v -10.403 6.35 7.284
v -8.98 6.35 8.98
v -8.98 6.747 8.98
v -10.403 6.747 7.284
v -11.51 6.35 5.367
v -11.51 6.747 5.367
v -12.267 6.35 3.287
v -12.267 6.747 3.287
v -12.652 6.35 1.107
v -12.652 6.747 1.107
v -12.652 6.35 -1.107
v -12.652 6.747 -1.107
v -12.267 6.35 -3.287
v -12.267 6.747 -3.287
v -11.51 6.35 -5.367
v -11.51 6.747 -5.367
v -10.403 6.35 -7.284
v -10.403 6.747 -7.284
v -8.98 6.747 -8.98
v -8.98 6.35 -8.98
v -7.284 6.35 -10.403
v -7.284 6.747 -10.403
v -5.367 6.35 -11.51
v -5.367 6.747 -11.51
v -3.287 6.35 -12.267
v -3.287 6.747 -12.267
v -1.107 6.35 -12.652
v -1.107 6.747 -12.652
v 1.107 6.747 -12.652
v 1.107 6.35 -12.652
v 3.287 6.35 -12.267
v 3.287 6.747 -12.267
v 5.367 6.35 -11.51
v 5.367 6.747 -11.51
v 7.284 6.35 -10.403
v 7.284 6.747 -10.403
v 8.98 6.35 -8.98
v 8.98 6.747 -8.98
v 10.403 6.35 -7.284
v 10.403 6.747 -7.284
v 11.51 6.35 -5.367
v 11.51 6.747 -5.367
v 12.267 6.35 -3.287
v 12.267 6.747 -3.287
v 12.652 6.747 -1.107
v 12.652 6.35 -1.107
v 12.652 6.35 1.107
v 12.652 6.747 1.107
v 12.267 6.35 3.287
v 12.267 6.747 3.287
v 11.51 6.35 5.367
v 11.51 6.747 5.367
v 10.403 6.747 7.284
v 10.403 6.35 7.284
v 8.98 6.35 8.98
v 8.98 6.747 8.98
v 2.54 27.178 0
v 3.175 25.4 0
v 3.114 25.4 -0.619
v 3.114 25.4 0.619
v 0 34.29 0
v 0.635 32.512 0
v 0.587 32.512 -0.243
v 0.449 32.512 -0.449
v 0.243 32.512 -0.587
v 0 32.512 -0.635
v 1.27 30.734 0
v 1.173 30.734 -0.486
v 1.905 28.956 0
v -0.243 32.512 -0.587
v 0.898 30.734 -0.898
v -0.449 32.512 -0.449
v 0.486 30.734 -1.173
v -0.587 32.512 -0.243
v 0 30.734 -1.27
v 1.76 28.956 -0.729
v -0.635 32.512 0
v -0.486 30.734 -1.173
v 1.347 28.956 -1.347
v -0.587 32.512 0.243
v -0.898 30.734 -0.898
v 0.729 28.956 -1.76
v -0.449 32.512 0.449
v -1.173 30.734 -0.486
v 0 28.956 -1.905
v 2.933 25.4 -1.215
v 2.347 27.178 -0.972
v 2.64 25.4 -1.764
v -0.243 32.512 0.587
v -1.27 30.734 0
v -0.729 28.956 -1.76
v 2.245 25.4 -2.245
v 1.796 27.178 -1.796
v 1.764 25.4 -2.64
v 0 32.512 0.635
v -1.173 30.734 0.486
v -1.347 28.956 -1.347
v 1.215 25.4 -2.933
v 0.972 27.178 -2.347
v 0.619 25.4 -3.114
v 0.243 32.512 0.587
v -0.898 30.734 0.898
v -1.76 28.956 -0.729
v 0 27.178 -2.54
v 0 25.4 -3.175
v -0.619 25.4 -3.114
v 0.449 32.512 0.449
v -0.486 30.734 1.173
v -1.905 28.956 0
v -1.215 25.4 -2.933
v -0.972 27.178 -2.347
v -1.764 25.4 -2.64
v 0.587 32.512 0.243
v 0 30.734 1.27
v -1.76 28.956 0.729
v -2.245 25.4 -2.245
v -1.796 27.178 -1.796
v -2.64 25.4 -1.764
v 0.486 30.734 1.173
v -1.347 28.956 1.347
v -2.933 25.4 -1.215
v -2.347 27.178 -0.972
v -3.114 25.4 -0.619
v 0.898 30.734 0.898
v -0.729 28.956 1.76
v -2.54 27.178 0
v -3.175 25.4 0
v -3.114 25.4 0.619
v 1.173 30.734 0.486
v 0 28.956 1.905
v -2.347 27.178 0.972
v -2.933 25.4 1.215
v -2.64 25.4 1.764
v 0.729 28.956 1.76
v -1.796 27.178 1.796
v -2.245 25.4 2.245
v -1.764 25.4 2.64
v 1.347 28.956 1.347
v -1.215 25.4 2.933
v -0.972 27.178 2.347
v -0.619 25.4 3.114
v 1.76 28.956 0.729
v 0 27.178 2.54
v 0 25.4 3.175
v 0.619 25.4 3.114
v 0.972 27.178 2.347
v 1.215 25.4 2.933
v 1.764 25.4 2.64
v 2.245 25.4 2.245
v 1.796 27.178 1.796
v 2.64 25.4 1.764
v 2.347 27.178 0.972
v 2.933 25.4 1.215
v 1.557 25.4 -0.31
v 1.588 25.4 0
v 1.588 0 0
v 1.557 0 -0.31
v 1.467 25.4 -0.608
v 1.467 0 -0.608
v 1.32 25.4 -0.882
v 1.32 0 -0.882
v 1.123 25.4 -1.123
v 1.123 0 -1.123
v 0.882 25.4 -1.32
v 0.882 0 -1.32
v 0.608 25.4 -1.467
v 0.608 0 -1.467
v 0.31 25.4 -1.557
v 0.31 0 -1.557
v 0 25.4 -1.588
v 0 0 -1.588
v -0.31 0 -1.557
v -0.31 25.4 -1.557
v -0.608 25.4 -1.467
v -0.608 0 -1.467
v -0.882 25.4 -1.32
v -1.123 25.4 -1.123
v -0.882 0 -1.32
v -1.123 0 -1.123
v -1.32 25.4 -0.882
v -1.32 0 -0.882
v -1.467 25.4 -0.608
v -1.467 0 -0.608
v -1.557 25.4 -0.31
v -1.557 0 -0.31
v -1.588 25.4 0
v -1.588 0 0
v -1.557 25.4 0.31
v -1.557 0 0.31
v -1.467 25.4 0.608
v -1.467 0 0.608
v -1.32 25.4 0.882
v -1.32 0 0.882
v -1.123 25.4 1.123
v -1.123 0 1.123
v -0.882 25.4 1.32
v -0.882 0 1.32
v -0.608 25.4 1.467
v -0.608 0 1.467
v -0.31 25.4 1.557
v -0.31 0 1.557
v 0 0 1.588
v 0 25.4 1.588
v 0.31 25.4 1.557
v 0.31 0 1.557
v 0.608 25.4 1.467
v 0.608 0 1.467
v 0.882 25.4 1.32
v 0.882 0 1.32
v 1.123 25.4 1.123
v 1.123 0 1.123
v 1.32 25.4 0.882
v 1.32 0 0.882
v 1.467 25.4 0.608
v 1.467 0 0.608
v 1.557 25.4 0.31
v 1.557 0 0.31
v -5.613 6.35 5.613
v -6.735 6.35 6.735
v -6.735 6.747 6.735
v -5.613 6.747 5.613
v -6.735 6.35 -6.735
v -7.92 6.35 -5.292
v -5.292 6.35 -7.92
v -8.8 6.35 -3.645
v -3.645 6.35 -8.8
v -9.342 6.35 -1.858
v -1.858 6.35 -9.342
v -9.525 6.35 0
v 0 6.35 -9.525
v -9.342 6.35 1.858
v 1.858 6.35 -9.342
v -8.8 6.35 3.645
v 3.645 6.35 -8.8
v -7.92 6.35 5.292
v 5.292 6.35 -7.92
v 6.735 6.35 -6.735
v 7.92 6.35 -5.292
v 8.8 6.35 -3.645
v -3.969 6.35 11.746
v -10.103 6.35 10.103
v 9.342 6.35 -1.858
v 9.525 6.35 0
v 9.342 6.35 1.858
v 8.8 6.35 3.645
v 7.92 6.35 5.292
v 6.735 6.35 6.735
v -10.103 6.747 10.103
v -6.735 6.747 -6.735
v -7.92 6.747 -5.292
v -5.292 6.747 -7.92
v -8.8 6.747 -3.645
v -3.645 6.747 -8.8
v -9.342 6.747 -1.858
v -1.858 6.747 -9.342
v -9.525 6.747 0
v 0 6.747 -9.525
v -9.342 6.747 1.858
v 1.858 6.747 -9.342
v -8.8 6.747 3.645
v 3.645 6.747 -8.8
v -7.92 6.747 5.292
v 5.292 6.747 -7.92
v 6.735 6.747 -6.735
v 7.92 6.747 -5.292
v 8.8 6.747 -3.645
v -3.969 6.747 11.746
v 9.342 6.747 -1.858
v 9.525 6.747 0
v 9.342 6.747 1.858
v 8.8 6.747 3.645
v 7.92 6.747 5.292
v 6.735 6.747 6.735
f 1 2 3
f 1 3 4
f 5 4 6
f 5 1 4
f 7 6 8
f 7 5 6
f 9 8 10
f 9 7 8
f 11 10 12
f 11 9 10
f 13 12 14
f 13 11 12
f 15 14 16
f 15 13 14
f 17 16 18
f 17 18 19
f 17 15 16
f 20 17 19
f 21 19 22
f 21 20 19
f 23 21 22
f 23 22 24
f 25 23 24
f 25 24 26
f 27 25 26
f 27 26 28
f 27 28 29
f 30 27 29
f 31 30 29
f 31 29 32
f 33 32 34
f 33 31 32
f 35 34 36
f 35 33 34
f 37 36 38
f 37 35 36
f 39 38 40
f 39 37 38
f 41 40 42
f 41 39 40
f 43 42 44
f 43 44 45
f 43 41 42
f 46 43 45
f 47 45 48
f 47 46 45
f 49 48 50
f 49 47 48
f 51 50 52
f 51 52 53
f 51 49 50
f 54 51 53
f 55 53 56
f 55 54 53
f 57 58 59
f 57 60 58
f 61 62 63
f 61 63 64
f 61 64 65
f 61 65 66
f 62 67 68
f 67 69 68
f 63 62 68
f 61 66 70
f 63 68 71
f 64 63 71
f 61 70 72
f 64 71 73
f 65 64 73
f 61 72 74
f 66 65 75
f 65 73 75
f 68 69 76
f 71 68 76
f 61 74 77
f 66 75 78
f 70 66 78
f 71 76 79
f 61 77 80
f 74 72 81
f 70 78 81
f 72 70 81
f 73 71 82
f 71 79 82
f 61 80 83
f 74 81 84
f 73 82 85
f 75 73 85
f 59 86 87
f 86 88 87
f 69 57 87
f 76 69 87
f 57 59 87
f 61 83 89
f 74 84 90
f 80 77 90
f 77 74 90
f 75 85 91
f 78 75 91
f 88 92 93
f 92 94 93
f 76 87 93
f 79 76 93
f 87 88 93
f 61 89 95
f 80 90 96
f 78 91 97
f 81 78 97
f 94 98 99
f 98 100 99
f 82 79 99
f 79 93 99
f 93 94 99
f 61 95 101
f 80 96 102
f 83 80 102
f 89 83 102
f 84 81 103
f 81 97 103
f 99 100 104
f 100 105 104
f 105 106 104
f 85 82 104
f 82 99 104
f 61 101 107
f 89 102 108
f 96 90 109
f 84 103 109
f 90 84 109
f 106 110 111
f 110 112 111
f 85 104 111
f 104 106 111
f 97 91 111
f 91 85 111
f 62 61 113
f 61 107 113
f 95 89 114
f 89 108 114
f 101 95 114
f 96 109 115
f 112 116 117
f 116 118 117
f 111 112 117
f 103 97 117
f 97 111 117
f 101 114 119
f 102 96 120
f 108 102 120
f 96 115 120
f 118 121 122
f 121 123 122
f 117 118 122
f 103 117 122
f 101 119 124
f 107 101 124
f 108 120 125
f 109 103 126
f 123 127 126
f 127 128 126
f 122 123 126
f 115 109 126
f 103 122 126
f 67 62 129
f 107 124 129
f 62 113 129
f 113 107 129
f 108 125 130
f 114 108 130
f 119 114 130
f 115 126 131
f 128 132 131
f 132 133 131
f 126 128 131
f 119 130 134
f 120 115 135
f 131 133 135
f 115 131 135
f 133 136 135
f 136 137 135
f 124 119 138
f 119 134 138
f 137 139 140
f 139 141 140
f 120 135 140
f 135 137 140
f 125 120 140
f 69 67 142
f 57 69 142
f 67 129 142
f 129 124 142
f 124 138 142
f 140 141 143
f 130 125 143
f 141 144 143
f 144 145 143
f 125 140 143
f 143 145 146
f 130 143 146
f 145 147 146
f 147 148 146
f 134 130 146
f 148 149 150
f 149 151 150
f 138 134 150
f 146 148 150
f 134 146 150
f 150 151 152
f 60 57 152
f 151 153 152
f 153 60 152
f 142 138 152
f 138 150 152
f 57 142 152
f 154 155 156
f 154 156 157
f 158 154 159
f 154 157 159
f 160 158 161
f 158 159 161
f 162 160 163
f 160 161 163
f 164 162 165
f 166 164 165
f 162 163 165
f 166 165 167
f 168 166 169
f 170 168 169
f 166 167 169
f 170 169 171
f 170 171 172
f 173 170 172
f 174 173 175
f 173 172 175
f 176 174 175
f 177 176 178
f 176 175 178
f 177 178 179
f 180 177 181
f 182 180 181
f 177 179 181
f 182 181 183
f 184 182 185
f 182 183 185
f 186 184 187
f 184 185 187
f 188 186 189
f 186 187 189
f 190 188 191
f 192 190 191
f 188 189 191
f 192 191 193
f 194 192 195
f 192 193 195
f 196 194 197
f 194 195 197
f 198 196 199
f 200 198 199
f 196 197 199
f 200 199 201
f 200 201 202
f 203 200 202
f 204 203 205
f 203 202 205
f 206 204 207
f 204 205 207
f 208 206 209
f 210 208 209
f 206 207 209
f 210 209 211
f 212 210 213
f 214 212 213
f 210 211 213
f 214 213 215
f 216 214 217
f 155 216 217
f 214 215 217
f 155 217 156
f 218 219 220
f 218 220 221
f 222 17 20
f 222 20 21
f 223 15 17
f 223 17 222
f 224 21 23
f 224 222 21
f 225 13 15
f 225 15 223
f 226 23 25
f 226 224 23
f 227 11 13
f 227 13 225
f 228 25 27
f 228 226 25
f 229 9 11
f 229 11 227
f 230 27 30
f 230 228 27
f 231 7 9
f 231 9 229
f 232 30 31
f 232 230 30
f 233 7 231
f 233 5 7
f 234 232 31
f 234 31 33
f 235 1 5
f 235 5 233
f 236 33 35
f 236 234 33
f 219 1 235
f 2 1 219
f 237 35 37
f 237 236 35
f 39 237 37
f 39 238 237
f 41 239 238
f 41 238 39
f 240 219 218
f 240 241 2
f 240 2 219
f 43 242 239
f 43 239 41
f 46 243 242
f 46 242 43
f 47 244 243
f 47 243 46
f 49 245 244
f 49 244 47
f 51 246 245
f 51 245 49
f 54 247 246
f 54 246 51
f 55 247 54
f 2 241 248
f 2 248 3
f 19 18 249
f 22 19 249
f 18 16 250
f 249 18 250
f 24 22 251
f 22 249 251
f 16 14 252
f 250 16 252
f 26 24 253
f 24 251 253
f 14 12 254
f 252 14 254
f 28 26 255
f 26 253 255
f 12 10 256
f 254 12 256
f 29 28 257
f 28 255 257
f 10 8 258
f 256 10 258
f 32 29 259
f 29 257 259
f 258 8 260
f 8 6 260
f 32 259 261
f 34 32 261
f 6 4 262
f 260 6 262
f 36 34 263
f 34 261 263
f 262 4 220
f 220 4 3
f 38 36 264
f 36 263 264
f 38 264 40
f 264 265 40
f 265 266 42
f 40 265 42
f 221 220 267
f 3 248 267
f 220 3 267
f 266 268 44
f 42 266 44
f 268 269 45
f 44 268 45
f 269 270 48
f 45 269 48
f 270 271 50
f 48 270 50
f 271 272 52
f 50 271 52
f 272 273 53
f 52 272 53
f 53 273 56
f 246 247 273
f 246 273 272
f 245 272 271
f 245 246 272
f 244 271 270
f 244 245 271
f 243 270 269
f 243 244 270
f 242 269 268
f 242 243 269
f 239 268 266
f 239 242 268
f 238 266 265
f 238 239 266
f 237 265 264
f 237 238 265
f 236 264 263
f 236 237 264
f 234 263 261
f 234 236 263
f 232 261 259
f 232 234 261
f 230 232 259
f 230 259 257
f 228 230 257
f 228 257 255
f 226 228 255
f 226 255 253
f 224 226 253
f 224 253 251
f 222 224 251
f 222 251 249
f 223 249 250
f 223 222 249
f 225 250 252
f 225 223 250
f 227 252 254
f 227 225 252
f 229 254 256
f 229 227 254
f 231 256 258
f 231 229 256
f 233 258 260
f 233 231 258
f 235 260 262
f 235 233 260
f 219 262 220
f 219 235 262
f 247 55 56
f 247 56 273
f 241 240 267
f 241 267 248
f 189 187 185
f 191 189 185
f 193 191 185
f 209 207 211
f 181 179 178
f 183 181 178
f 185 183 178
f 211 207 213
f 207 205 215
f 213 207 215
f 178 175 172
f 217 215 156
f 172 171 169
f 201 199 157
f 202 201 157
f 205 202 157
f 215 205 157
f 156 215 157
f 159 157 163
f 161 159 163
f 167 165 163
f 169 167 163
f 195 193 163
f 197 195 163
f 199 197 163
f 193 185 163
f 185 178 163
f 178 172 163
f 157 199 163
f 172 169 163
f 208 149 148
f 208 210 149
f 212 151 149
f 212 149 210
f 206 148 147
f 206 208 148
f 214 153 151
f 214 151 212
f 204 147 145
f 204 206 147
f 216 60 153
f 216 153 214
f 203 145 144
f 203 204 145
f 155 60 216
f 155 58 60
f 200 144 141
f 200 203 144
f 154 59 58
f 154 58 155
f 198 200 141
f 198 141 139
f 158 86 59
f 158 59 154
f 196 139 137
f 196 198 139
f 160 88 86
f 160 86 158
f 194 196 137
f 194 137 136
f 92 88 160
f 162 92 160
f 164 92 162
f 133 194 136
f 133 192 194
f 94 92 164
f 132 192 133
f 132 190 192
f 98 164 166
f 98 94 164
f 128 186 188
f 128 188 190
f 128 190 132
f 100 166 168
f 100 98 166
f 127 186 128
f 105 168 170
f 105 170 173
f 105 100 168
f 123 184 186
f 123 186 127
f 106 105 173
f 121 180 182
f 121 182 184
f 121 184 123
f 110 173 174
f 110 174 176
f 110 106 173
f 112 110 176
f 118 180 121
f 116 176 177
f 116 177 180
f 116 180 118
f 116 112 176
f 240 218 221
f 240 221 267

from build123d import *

# Parameters (mm, degrees)
SKETCH1_R           = 1.5875
BOSS_EXTRUDE1_DEPTH = 25.4
BOSS_EXTRUDE2_START = -6.35
BOSS_EXTRUDE2_DEPTH = 0.396875


with BuildPart() as part:
    # Sketch1 → Boss-Extrude1 (new body)
    with BuildSketch(Plane(origin=(0, 0, 0), x_dir=(1, 0, 0), z_dir=(0, 1, 0))):
        Circle(SKETCH1_R)
    extrude(amount=BOSS_EXTRUDE1_DEPTH)

    # Sketch3 → Revolve1 (revolve)
    with BuildSketch(Plane.XY):
        Polygon((0, 25.4), (0, 34.29), (3.175, 25.4), (1.5875, 25.4), align=None)
    revolve(axis=Axis((0, 25.4, 0), (0, 1, 0)))


with BuildPart() as body_2:
    # Sketch4 → Boss-Extrude2 (new body)
    with BuildSketch(Plane.XZ.offset(BOSS_EXTRUDE2_START)):
        with BuildLine():
            Line((-6.735192091, 6.735192091), (-5.612660076, 5.612660076))
            Line((-5.612660076, 5.612660076), (-3.969159139, 11.746289073))
            Line((-3.969159139, 11.746289073), (-10.102788136, 10.102788136))
            Line((-10.102788136, 10.102788136), (-8.980256121, 8.980256121))
            ThreePointArc((-8.980256121, 8.980256121), (0, -12.7), (8.980256121, 8.980256121))
            Line((8.980256121, 8.980256121), (6.735192091, 6.735192091))
            ThreePointArc((6.735192091, 6.735192091), (0, -9.525), (-6.735192091, 6.735192091))
        make_face()
    extrude(amount=-BOSS_EXTRUDE2_DEPTH)


solid = Compound([part.part, body_2.part])
